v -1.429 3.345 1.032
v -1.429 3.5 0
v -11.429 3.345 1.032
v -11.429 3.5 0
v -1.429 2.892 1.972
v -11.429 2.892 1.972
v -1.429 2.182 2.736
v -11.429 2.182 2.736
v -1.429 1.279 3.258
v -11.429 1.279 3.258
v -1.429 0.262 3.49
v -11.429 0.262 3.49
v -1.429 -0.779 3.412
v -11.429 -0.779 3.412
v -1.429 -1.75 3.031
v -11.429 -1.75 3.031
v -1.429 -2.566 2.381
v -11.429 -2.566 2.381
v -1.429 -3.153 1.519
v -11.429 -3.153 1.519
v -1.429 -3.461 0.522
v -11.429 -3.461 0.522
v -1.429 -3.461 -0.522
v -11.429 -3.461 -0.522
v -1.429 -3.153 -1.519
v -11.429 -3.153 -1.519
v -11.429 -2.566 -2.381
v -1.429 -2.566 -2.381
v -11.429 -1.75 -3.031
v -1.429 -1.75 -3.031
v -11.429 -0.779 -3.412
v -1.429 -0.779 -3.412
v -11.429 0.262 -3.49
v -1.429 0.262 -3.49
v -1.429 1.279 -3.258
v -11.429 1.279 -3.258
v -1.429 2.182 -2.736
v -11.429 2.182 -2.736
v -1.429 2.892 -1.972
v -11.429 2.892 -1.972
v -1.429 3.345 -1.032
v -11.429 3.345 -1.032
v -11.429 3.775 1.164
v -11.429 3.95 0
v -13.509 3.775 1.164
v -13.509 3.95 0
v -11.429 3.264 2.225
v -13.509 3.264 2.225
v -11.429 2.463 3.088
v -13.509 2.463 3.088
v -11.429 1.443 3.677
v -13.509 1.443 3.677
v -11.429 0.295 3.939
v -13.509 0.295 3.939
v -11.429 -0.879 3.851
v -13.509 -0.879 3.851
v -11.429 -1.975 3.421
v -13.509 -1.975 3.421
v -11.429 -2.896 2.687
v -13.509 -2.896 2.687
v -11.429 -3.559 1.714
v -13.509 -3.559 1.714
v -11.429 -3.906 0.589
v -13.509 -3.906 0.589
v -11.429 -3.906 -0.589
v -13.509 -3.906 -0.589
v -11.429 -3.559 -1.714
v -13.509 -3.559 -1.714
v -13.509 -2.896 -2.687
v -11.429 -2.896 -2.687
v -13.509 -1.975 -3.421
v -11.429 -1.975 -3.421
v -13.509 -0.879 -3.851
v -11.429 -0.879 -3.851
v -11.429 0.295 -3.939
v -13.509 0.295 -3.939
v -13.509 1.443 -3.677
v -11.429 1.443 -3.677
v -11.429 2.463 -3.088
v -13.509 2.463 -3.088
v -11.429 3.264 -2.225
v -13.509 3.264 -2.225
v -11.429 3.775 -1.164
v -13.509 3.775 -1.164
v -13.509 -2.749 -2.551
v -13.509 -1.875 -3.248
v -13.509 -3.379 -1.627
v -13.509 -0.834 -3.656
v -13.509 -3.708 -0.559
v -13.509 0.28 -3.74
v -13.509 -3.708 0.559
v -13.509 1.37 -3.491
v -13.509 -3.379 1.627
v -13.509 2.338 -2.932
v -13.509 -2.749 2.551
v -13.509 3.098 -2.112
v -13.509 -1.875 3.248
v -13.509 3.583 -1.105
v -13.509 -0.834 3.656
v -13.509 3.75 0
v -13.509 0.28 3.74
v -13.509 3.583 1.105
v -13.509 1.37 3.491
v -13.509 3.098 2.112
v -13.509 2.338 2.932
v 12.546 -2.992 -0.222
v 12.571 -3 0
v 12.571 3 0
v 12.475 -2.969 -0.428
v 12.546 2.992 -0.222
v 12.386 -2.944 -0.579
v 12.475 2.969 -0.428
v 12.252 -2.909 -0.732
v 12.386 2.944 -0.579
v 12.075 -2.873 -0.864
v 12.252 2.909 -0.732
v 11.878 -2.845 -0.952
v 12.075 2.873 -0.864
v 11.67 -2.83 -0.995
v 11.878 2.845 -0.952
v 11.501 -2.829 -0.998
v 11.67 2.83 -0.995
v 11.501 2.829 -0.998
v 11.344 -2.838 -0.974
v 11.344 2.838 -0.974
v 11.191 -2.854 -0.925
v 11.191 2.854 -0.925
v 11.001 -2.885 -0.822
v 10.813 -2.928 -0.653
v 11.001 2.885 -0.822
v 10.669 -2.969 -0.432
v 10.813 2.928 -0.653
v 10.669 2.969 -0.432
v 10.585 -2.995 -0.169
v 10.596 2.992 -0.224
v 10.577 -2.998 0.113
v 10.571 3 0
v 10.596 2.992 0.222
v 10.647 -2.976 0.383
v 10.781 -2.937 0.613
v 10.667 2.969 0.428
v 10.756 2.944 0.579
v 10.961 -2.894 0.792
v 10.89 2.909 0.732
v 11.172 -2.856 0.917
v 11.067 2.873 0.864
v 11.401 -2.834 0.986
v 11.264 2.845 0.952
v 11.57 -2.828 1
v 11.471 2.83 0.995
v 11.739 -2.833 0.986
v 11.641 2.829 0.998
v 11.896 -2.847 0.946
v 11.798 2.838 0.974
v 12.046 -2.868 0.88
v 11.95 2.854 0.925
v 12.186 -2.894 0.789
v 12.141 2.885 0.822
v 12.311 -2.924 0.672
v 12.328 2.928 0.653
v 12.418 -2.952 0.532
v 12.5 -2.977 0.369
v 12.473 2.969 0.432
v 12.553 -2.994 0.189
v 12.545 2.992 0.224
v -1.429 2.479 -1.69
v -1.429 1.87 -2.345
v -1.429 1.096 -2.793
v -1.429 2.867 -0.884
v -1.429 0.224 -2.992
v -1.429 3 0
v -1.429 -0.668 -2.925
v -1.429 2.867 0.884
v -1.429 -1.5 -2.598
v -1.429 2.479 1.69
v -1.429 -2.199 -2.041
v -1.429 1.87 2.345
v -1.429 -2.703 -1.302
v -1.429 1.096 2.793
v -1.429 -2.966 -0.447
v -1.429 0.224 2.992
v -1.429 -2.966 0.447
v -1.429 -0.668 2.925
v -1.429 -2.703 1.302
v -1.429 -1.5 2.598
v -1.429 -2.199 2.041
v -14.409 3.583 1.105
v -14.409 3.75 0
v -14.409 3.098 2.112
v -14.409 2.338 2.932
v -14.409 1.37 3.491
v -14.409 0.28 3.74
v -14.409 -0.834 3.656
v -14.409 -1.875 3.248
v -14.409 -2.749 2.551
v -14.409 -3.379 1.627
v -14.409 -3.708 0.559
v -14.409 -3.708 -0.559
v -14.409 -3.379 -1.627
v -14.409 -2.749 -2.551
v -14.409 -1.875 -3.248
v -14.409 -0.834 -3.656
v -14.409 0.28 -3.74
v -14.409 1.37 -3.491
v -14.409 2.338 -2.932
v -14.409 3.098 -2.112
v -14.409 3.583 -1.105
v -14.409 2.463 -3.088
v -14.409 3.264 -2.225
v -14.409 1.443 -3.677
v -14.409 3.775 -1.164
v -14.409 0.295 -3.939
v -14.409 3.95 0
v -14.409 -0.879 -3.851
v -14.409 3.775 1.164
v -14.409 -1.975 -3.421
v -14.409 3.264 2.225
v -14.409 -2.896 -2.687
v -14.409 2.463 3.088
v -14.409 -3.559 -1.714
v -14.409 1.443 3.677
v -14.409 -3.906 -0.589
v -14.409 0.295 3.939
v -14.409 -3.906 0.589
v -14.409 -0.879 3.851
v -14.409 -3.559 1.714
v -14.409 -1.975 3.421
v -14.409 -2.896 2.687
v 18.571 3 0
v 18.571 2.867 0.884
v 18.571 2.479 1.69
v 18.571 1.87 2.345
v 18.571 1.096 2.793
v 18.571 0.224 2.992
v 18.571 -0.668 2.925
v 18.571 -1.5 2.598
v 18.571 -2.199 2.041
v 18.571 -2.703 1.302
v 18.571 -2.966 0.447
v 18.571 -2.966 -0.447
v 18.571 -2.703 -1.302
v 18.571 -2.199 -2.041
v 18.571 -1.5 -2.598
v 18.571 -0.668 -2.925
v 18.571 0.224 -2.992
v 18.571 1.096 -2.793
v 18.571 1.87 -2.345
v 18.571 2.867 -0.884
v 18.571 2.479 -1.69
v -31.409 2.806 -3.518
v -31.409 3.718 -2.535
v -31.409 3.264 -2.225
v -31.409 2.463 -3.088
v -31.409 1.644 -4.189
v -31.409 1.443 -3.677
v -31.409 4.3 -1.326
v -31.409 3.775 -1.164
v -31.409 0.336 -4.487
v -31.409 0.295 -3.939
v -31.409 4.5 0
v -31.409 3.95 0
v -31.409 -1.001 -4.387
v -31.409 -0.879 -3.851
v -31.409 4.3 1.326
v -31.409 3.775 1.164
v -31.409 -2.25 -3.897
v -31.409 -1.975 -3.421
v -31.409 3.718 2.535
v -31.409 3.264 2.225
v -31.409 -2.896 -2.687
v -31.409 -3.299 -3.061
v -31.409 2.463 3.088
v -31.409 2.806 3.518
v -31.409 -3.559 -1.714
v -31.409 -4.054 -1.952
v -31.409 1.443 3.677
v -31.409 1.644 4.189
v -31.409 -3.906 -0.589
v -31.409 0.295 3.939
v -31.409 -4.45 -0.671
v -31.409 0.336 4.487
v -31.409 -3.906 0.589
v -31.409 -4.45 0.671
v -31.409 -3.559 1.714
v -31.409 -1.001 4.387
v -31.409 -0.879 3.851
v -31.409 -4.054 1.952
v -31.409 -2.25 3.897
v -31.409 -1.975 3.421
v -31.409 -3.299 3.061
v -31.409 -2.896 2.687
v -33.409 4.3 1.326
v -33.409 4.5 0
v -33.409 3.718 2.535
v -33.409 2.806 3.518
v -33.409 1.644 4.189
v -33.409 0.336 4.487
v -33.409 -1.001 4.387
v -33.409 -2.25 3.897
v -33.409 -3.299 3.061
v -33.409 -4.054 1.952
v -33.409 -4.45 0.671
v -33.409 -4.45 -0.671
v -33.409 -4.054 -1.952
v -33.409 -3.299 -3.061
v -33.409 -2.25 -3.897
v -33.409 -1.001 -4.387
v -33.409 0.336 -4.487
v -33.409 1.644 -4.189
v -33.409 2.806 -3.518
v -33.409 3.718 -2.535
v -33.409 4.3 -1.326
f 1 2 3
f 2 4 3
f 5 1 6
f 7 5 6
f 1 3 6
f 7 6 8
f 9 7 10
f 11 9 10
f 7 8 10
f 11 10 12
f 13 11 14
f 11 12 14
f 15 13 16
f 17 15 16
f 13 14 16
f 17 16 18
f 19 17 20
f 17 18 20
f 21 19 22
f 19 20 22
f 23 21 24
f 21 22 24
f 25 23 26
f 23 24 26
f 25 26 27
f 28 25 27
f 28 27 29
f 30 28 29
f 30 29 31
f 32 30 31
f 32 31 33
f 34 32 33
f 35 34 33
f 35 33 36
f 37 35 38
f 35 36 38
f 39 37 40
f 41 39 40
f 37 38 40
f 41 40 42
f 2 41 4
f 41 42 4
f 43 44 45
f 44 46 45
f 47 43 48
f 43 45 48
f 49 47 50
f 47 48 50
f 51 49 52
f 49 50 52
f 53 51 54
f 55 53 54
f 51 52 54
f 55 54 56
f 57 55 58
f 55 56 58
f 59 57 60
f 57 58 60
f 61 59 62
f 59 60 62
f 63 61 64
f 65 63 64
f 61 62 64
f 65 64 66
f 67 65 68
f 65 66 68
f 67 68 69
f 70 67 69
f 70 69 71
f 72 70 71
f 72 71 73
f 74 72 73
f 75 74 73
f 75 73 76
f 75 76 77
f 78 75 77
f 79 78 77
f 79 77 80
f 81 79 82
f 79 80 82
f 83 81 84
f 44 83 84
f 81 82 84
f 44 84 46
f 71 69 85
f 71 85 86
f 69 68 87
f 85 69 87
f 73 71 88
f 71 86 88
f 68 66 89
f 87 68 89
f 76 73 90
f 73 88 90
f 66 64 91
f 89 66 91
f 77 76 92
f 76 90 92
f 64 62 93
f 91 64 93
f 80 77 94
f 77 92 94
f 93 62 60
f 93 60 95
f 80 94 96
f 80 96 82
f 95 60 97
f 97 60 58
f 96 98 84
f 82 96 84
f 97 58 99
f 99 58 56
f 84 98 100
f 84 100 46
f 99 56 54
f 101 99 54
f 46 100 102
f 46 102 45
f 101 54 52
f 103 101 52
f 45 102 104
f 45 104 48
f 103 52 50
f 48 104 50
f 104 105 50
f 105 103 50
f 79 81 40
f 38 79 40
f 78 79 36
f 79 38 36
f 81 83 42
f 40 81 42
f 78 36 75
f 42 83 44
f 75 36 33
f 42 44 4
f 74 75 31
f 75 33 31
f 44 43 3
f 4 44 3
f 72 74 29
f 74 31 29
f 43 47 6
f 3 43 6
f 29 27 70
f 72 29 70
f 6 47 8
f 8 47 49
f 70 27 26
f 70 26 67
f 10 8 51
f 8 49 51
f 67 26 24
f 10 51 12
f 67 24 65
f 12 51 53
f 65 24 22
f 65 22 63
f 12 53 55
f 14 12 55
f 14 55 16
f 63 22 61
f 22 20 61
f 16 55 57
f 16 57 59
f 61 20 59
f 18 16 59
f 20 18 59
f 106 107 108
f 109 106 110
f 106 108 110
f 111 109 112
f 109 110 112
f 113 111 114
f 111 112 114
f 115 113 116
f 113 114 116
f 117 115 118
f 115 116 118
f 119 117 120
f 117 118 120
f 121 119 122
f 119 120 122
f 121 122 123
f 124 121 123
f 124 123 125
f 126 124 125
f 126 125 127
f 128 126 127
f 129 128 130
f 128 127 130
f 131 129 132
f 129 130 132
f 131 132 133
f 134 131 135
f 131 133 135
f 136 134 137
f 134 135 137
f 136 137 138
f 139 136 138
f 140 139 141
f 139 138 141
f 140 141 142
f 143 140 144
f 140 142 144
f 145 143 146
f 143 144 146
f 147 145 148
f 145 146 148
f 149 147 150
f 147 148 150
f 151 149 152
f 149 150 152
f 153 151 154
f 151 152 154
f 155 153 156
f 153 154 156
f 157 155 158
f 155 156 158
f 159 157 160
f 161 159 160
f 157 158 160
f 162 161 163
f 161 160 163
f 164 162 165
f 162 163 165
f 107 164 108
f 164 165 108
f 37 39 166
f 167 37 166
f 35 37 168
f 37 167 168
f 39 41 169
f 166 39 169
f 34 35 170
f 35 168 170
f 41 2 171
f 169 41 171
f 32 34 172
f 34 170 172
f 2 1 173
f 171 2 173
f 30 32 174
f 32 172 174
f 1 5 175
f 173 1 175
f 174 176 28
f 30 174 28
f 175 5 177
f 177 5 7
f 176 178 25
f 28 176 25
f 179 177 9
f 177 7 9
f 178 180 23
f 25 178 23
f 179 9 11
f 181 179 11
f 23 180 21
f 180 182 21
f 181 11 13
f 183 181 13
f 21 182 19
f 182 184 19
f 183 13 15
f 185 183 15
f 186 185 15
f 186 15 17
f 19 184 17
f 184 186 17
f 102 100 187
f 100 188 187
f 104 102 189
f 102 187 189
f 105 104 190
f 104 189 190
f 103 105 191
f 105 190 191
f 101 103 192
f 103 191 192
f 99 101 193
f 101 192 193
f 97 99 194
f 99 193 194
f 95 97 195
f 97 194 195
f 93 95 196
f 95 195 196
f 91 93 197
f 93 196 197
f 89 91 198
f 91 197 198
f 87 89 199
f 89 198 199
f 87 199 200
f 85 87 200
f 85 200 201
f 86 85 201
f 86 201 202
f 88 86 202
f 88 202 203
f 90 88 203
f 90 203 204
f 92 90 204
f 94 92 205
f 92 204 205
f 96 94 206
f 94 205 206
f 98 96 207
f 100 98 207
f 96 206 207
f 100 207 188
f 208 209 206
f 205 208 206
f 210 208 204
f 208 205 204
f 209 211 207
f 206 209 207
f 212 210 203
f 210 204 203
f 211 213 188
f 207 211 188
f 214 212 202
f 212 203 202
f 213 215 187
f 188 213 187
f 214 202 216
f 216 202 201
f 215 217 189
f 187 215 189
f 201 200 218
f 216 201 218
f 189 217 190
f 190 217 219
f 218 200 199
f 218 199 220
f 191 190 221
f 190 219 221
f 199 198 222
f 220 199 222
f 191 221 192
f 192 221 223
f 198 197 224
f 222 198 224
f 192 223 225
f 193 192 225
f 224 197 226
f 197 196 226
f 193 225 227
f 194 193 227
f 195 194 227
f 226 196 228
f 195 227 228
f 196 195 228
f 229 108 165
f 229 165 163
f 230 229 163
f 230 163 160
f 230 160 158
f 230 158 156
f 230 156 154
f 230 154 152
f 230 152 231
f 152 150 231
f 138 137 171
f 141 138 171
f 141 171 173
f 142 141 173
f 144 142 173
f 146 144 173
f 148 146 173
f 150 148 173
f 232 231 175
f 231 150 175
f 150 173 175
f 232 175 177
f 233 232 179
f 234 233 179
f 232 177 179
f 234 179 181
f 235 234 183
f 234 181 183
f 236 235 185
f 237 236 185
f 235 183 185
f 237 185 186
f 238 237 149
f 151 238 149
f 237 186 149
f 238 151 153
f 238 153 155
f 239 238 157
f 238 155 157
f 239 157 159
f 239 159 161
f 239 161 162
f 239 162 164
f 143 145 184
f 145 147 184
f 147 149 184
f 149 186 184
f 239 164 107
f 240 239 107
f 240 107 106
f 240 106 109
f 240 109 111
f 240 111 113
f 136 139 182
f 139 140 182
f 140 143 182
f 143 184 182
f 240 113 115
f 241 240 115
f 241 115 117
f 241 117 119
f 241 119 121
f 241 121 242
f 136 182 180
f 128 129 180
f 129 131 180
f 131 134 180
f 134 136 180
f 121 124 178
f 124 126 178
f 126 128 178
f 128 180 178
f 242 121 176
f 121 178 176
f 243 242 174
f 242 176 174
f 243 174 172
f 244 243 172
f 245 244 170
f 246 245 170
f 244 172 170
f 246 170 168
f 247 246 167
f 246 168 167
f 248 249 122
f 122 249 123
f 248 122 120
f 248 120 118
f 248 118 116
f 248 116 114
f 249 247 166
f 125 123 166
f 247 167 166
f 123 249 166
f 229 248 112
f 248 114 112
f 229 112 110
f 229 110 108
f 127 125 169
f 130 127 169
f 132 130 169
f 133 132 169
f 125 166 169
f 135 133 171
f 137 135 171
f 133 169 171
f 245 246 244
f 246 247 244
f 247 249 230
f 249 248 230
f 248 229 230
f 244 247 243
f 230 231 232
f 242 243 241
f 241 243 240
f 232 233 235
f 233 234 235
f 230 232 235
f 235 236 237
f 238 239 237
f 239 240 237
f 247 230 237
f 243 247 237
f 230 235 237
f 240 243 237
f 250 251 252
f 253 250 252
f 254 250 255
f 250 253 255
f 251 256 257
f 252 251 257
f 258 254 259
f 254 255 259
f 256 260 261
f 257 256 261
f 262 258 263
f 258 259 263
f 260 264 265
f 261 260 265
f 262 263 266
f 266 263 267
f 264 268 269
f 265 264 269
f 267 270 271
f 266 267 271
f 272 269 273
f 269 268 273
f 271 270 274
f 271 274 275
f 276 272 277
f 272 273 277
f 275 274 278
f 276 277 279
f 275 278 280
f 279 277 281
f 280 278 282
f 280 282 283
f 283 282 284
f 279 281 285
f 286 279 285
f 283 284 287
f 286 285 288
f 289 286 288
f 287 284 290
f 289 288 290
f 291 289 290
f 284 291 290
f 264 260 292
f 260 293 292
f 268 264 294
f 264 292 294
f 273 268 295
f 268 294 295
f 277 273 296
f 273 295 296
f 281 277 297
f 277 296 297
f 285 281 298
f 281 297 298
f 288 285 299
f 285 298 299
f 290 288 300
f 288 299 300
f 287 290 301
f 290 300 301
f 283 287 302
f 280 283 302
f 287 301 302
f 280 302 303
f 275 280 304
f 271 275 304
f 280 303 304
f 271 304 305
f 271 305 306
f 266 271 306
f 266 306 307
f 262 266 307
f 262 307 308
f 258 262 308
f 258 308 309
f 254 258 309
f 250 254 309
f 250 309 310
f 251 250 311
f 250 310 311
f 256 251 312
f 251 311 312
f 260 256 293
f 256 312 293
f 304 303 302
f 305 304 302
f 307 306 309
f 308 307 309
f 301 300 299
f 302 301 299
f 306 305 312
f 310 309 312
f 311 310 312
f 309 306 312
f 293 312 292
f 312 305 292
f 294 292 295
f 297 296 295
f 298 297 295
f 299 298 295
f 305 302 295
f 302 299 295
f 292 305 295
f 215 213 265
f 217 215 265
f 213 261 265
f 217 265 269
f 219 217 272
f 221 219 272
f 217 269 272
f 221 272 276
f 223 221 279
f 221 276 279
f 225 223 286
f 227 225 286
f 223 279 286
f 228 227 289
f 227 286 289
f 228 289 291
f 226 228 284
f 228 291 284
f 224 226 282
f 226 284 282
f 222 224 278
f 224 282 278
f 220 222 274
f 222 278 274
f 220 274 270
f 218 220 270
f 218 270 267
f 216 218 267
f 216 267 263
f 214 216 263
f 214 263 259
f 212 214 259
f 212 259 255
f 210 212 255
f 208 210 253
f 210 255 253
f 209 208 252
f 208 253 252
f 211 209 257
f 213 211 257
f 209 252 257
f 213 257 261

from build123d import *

# Parameters (mm, degrees)
SKETCH_2_R          = 1
CUT_EXTRUDE_1_DEPTH = 5


with BuildPart() as part:
    # 草图1 → 旋转1 (revolve)
    with BuildSketch(Plane.XY):
        Polygon((-33.409090909, 0), (18.570909091, 0), (18.570909091, 3), (-1.429090909, 3), (-1.429090909, 3.5), (-11.429090909, 3.5), (-11.429090909, 3.95), (-13.509090909, 3.95), (-13.509090909, 3.75), (-14.409090909, 3.75), (-14.409090909, 3.95), (-31.409090909, 3.95), (-31.409090909, 4.5), (-33.409090909, 4.5), align=None)
    revolve(axis=Axis((-66.136363636, 0, 0), (1, 0, 0)))

    # 草图2 → 切除-拉伸1 (cut, symmetric)
    with BuildSketch(Plane(origin=(0, 0, 0), x_dir=(1, 0, 0), z_dir=(0, 1, 0))):
        with Locations((11.570909091, 0)):
            Circle(SKETCH_2_R)
    extrude(amount=CUT_EXTRUDE_1_DEPTH, both=True, mode=Mode.SUBTRACT)


solid = part.part
